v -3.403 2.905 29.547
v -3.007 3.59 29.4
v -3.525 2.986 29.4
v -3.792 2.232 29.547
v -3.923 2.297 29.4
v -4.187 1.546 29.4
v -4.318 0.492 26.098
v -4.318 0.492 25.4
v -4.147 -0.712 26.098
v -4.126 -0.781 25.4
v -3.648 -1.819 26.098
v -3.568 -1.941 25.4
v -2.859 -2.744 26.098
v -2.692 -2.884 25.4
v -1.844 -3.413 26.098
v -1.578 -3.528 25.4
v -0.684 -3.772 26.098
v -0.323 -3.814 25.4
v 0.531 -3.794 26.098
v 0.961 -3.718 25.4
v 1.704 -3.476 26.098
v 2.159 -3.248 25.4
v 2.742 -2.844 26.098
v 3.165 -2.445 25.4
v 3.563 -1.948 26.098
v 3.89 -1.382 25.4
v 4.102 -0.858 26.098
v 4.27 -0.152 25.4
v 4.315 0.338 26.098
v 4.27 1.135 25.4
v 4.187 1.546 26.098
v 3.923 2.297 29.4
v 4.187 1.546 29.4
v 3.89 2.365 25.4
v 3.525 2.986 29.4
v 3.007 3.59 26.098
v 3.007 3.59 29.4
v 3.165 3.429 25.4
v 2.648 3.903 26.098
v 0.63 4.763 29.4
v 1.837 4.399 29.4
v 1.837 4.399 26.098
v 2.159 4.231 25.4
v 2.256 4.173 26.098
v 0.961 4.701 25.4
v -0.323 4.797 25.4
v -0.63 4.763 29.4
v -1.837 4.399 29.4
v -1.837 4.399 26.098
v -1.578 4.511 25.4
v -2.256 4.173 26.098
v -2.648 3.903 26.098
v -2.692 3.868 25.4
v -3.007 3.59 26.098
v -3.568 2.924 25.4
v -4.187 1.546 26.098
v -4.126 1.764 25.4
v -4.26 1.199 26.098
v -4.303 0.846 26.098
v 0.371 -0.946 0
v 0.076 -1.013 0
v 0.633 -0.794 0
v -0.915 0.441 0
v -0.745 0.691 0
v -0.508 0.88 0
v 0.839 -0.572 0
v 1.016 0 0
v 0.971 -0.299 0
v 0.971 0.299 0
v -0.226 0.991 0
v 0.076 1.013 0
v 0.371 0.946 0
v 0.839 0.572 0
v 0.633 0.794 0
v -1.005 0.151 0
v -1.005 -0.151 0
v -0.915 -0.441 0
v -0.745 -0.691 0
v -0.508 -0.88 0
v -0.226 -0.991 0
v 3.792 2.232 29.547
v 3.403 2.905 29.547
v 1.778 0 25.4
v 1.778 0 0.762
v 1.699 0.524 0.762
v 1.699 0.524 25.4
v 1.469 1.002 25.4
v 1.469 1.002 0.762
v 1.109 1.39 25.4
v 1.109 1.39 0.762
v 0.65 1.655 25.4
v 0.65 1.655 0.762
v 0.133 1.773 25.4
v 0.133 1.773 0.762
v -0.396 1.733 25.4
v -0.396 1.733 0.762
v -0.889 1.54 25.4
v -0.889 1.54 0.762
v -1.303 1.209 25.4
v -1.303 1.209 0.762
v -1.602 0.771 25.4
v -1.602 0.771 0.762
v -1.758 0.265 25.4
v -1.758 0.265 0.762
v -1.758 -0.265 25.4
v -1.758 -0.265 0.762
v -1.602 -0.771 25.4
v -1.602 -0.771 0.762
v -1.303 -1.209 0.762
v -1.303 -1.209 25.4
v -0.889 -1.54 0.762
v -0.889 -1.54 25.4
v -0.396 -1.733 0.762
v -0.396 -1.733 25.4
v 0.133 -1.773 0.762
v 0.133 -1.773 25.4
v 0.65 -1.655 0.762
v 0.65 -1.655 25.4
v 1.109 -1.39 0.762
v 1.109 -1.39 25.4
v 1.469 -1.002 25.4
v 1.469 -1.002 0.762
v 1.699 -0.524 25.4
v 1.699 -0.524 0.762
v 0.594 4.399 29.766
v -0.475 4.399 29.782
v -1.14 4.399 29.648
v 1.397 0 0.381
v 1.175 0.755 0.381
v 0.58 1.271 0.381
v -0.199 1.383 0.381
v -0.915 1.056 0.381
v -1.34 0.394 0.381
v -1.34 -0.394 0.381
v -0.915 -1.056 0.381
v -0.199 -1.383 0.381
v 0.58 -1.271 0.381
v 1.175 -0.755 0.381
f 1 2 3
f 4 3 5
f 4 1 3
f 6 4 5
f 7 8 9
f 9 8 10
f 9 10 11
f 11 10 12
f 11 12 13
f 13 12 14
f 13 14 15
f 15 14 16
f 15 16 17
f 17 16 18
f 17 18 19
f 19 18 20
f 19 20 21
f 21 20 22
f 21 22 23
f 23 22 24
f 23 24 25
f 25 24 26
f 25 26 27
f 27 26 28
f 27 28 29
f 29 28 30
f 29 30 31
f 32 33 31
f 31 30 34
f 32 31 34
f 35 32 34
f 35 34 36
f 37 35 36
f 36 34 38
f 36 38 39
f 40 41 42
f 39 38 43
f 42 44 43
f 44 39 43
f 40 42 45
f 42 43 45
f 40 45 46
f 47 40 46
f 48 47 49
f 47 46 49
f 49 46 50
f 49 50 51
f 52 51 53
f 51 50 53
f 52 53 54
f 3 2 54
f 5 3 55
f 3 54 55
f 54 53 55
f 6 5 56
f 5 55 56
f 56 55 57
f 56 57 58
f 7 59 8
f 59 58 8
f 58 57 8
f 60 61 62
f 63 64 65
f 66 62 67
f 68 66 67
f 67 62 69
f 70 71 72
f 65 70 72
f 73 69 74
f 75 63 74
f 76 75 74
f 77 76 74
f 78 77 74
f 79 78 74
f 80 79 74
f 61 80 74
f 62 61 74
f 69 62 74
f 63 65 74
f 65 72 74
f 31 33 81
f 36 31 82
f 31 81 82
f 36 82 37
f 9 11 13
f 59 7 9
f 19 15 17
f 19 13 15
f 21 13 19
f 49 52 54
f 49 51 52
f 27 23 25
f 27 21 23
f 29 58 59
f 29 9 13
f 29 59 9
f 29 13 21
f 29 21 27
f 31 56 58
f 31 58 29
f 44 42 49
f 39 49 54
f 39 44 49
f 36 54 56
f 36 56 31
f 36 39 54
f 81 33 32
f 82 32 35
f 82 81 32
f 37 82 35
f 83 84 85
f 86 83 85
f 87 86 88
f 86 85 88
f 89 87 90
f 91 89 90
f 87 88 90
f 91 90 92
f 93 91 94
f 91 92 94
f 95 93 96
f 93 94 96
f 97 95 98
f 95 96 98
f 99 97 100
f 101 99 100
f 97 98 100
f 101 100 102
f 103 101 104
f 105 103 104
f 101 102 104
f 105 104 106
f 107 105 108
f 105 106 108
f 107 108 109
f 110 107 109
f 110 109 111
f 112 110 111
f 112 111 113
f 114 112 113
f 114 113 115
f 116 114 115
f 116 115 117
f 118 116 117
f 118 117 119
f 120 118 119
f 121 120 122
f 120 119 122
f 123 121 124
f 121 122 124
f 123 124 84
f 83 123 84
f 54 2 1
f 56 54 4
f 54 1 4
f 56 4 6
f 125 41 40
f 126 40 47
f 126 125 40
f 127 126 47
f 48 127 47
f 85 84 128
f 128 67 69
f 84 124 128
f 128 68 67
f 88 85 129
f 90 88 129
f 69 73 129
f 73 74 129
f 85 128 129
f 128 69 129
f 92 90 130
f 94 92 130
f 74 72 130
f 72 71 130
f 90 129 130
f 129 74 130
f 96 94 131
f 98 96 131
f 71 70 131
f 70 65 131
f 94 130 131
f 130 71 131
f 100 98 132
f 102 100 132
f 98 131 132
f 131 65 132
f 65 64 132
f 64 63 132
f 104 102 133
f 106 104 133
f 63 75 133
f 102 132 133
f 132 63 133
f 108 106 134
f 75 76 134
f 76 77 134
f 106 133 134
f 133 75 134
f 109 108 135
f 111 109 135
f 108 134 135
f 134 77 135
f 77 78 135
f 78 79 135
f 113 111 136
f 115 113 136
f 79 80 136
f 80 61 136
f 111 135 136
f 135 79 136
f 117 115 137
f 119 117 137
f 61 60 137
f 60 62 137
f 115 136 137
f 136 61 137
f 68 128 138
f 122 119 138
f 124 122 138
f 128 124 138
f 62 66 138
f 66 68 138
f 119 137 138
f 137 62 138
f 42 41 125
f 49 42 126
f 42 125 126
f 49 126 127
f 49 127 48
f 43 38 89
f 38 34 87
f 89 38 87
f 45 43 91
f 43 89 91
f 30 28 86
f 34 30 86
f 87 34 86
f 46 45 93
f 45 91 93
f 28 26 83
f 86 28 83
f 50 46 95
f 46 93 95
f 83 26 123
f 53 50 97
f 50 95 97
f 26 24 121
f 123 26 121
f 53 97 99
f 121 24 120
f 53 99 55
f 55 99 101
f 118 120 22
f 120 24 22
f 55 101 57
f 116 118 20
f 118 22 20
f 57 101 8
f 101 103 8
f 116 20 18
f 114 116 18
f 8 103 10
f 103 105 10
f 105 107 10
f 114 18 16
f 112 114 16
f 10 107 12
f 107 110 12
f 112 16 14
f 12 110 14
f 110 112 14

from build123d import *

# Parameters (mm, degrees)
SKETCH1_R          = 1.778
EXTRUDE1_DEPTH     = 25.4
SKETCH3_R          = 4.318
EXTRUDE3_DEPTH     = 4.7625
CHAMFER1_SIZE      = 0.762
CUT_EXTRUDE1_DEPTH = 4.064


with BuildPart() as part:
    # Sketch1 → Extrude1 (new body)
    with BuildSketch(Plane.XY):
        Circle(SKETCH1_R)
    extrude(amount=EXTRUDE1_DEPTH)

    # Sketch3 → Extrude3 (add)
    with BuildSketch(Plane.XY.offset(25.4)):
        with Locations(Location((0, 0.491553118, 0), (0, 0, 180))):
            Circle(SKETCH3_R)
    extrude(amount=EXTRUDE3_DEPTH)

    # Chamfer1
    chamfer1_edges = [part.edges().sort_by_distance(p)[0] for p in [
        (-1.778, 0, 0),
        (4.318, 0.491553118, 30.1625),
    ]]
    chamfer(chamfer1_edges, length=CHAMFER1_SIZE)

    # Sketch4 → Cut-Extrude1 (cut)
    with BuildSketch(Plane.XY.offset(30.1625)):
        Polygon((5.08, 0), (2.54, 4.399409051), (-2.54, 4.399409051), (-5.08, 0), (-2.54, -4.399409051), (2.54, -4.399409051), align=None)
    extrude(amount=-CUT_EXTRUDE1_DEPTH, mode=Mode.SUBTRACT)


solid = part.part
